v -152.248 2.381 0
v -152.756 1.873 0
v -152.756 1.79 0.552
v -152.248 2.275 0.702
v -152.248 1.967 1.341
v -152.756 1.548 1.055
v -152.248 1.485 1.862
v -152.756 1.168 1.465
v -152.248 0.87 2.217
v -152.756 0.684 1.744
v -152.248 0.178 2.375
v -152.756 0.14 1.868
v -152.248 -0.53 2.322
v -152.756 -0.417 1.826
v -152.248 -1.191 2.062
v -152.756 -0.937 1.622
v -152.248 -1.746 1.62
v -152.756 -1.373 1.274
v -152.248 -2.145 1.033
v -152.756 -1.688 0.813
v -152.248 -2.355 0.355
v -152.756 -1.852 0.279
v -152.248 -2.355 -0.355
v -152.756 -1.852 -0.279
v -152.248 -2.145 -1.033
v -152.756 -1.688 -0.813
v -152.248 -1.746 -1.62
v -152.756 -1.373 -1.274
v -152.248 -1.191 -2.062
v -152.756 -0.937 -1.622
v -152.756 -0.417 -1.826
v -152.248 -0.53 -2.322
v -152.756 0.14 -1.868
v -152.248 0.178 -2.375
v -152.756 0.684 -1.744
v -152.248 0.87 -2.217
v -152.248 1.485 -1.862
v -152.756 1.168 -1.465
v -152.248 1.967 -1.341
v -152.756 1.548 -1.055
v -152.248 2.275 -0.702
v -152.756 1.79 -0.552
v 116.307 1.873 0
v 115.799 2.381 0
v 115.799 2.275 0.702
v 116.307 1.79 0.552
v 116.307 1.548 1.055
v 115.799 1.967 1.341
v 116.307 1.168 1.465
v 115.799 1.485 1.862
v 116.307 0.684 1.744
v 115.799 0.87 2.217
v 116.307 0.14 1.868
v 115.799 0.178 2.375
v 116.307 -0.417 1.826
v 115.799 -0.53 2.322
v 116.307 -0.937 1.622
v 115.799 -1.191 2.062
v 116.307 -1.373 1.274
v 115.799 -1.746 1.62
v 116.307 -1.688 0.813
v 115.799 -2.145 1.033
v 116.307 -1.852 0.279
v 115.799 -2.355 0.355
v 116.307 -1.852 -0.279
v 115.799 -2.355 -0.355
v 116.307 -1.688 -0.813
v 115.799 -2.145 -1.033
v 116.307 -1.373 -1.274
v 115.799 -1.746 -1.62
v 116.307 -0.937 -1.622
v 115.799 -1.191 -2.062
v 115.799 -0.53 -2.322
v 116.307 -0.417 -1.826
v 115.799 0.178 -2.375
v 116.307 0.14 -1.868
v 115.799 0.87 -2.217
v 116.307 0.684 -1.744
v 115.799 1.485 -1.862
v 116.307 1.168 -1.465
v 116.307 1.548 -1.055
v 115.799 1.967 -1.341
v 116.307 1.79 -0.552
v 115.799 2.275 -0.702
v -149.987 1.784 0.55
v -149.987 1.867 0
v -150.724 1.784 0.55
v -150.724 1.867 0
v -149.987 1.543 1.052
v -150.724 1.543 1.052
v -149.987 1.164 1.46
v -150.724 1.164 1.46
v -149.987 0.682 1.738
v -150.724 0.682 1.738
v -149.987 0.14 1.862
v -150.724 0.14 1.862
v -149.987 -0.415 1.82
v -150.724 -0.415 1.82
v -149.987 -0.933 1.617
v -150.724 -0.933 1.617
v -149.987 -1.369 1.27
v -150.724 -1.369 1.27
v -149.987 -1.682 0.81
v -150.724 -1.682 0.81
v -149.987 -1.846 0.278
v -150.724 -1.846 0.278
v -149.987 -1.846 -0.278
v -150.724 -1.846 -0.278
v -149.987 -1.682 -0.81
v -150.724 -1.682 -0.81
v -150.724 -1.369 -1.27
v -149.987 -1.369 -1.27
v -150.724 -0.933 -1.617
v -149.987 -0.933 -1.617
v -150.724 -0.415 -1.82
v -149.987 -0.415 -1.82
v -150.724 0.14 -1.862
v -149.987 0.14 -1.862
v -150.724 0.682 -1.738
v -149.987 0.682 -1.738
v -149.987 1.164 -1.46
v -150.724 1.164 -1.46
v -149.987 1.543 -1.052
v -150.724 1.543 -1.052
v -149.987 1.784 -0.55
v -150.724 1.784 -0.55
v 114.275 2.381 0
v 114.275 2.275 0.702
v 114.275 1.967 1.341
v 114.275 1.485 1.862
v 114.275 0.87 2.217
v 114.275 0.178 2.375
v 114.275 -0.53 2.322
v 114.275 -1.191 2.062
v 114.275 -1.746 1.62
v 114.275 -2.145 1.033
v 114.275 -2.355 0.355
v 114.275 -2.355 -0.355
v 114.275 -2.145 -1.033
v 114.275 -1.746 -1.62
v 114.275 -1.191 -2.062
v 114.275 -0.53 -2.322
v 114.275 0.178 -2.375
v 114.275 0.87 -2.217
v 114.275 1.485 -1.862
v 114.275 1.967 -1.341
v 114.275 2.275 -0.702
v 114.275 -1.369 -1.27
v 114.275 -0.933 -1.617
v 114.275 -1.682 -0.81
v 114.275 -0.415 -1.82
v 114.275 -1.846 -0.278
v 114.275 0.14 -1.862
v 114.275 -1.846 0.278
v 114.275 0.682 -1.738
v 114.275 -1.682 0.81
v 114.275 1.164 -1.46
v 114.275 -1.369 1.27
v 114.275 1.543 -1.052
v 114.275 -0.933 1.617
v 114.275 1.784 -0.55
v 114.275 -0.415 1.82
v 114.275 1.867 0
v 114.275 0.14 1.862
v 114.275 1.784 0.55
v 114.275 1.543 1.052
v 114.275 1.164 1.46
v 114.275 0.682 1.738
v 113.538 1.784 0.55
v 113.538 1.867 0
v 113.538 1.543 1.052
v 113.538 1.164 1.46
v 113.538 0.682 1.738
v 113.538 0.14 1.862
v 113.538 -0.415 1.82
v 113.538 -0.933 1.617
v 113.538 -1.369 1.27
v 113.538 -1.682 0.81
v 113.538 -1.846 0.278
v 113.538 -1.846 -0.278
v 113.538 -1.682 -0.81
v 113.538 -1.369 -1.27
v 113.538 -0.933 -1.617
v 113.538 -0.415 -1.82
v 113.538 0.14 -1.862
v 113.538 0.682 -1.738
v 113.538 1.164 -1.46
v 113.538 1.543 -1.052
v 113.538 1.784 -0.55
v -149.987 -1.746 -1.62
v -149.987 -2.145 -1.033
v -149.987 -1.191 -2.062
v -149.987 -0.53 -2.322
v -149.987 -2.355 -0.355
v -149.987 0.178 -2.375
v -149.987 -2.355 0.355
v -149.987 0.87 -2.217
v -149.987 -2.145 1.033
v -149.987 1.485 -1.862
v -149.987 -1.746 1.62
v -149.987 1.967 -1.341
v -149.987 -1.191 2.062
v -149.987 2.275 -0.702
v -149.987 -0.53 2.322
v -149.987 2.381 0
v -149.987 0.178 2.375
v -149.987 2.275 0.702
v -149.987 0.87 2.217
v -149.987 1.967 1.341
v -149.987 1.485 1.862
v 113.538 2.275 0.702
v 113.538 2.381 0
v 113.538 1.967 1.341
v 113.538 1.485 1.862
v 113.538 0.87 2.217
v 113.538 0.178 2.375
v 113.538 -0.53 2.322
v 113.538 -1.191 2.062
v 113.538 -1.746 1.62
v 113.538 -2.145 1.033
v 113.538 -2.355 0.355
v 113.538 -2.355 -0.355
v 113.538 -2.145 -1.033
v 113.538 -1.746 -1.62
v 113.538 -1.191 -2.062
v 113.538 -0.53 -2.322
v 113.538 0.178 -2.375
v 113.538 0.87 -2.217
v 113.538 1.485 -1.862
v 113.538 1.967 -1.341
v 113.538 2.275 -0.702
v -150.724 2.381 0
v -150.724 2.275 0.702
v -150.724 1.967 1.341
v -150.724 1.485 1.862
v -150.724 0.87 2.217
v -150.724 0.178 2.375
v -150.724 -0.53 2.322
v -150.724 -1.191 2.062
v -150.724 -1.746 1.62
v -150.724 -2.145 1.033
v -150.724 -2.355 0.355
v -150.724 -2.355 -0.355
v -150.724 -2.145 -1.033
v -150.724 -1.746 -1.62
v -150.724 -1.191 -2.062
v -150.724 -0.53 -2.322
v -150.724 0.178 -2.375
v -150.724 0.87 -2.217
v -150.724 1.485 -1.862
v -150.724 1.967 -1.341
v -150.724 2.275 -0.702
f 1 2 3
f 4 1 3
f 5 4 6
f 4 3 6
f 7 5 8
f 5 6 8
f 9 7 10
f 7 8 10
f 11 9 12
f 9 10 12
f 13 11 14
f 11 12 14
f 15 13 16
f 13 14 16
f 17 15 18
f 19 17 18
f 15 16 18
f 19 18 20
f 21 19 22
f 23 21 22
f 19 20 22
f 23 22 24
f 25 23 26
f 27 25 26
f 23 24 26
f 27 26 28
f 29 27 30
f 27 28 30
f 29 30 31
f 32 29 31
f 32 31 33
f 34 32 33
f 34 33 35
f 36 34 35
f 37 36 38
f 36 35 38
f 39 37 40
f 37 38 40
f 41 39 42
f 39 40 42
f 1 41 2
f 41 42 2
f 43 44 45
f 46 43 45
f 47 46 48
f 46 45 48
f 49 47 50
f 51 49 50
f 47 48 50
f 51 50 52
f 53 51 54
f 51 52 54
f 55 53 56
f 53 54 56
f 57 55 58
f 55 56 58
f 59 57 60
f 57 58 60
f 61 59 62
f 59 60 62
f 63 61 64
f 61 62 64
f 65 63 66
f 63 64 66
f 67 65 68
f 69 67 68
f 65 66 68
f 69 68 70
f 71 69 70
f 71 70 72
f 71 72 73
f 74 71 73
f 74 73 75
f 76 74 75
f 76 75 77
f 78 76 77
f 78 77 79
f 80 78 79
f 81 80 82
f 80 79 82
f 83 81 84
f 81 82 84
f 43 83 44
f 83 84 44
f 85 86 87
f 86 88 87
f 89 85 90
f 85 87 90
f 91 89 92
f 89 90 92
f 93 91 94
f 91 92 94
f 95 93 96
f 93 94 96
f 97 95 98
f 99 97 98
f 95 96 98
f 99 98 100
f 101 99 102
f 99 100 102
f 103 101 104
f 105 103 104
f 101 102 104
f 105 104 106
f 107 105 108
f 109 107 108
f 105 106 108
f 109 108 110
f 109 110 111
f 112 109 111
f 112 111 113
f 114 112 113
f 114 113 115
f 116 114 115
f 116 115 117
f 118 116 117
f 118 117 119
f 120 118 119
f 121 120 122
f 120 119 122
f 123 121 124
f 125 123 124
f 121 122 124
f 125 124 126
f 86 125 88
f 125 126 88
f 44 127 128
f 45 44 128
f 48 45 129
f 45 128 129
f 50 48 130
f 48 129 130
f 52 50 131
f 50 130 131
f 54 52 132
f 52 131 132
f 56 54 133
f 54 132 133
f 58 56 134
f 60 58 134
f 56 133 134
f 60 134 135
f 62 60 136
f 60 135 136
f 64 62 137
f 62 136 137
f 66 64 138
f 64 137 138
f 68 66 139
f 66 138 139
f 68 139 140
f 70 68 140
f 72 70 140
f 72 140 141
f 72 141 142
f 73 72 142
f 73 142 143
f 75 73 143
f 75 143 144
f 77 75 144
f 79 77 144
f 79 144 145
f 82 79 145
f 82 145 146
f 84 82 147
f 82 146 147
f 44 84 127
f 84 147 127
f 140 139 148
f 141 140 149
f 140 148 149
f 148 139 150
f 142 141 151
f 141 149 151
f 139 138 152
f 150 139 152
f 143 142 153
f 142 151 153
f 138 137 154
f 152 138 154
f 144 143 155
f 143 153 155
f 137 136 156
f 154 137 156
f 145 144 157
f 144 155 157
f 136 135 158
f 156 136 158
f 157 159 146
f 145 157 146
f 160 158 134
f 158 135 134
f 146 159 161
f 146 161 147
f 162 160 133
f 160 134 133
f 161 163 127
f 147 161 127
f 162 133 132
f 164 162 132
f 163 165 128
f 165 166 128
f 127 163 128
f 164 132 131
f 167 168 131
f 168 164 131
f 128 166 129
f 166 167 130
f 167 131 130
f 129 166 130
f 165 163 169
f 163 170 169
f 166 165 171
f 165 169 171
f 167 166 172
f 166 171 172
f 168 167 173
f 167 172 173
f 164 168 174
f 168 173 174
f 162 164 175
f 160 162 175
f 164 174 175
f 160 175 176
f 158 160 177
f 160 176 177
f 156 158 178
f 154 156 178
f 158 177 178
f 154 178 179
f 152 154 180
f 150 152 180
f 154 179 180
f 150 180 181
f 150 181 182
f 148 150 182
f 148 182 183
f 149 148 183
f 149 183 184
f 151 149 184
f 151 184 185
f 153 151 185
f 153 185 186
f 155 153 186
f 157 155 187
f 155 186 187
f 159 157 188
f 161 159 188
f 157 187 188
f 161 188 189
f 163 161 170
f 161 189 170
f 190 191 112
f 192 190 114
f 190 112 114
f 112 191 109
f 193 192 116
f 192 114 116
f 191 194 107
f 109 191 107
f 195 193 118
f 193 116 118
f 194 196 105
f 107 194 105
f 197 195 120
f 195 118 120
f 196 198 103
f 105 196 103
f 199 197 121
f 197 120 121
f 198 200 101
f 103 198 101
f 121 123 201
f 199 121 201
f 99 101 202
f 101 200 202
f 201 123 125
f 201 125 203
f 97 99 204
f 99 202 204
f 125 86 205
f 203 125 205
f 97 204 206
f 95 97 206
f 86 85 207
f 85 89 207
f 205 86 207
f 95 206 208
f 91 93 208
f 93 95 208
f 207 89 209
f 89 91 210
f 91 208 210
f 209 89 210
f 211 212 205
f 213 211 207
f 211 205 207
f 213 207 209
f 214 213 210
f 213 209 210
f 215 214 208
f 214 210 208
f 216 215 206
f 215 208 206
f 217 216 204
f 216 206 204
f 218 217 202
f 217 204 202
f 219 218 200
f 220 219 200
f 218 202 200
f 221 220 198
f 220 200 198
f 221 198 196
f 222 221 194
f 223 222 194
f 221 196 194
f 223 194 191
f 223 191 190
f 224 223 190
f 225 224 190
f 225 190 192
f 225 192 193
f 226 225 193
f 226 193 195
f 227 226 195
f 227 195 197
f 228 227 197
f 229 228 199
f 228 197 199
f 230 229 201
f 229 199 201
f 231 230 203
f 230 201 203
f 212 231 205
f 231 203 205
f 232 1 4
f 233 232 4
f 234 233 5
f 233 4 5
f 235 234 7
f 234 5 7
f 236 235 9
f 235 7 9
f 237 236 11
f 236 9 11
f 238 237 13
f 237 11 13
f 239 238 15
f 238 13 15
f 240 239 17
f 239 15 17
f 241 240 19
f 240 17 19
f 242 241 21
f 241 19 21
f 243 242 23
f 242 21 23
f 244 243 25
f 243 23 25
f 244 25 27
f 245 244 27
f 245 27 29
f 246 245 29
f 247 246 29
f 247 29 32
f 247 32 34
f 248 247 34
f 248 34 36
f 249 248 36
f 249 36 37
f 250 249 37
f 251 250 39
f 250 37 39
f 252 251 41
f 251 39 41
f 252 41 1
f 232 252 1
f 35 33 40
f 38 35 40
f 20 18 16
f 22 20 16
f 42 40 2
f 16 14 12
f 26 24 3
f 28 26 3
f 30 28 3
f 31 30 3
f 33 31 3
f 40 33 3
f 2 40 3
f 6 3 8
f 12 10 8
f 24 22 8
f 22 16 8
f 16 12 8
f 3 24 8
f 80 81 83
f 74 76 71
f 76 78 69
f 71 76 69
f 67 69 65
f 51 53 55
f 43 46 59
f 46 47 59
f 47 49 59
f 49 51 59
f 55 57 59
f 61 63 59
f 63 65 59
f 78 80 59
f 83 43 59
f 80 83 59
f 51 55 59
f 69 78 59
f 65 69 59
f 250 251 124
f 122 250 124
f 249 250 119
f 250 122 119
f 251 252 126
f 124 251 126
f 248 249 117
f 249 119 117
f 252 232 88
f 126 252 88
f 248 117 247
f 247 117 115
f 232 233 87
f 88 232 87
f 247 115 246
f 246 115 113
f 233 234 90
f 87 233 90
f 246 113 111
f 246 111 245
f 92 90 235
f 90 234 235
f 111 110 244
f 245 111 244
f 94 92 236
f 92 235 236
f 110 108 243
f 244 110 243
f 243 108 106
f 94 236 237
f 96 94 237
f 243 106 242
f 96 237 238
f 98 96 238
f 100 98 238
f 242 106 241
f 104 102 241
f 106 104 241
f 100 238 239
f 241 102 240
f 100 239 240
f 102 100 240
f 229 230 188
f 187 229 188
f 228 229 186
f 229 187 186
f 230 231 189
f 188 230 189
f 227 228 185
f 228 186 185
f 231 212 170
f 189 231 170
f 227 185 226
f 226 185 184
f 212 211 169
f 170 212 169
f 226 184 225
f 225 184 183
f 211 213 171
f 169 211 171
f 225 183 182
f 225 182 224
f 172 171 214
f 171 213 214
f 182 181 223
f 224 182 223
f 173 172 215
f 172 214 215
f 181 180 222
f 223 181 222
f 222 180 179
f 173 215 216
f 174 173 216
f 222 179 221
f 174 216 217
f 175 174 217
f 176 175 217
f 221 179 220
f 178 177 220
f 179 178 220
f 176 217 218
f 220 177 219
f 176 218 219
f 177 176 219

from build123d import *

# Parameters (mm, degrees)
CHAMFER1_SIZE = 0.508


with BuildPart() as part:
    # Sketch1 → Revolve1 (revolve)
    with BuildSketch(Plane.XY):
        Polygon((-152.7556, 0), (116.3066, 0), (116.3066, 2.38125), (114.2746, 2.38125), (114.2746, 1.8669), (113.538, 1.8669), (113.538, 2.38125), (-149.987, 2.38125), (-149.987, 1.8669), (-150.7236, 1.8669), (-150.7236, 2.38125), (-152.7556, 2.38125), align=None)
    revolve(axis=Axis((116.3066, 0, 0), (1, 0, 0)))

    # Chamfer1
    chamfer1_edges = [part.edges().sort_by_distance(p)[0] for p in [
        (-152.7556, -2.38125, 0),
        (116.3066, -2.38125, 0),
    ]]
    chamfer(chamfer1_edges, length=CHAMFER1_SIZE)


solid = part.part
